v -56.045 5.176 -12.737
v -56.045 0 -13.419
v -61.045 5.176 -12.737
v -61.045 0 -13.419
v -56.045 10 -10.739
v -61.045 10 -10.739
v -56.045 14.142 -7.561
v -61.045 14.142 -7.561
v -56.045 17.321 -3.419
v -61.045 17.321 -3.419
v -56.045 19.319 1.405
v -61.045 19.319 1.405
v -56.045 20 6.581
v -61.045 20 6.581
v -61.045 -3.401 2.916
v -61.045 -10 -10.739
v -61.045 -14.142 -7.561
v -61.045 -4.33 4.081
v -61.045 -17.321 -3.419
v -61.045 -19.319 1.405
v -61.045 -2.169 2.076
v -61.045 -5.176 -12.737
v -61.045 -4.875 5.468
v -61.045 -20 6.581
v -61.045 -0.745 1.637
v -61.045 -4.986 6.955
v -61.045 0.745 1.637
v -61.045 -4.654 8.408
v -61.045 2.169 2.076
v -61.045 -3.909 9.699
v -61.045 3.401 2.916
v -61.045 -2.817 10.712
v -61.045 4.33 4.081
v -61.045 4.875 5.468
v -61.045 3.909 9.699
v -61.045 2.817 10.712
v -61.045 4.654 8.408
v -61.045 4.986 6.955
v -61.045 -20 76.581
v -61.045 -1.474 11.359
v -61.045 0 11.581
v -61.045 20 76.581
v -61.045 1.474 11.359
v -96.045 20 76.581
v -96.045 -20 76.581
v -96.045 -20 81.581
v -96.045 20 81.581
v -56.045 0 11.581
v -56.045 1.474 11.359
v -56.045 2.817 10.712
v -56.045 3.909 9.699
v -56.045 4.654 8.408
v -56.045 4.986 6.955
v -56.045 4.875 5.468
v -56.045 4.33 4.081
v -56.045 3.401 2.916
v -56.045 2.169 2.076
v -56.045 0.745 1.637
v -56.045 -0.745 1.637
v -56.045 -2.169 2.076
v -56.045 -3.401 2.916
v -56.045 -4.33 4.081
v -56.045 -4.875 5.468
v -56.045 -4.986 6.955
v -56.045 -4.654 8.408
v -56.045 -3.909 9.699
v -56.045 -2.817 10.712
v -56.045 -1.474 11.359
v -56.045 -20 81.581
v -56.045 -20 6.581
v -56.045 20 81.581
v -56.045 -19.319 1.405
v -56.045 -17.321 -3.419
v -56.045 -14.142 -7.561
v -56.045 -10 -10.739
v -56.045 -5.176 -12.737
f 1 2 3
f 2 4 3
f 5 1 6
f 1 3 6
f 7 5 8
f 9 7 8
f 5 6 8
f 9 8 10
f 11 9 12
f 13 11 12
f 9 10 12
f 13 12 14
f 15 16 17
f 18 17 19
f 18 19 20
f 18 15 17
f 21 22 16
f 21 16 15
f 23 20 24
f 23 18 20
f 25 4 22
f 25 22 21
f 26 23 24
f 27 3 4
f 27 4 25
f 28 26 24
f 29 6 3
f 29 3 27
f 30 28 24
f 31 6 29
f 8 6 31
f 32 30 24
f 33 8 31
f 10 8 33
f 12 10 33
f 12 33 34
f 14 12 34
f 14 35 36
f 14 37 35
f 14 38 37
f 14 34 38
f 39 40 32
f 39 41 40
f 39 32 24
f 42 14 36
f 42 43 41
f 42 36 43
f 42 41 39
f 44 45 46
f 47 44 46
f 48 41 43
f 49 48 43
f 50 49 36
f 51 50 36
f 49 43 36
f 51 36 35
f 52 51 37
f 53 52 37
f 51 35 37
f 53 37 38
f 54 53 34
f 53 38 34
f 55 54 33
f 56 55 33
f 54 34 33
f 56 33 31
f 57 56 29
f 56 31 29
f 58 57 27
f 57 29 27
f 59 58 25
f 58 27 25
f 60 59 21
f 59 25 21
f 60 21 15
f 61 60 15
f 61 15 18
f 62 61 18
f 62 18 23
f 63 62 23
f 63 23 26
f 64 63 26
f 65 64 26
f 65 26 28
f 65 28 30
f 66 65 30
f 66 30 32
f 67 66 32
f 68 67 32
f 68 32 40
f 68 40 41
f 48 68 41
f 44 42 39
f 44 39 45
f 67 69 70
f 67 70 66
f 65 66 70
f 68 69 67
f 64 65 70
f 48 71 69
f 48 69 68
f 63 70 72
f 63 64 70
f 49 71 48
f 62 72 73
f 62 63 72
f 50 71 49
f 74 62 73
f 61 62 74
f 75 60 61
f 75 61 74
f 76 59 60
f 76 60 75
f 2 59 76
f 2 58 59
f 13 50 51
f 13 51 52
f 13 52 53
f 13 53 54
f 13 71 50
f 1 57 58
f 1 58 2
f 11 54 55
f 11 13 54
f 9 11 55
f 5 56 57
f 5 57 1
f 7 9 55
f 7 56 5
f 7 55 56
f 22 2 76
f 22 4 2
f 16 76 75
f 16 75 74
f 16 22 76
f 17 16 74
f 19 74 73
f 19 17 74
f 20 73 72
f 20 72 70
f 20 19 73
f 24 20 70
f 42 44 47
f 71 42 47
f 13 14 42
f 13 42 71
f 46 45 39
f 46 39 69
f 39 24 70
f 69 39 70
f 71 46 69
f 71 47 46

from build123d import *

# Parameters (mm, degrees)
BOSS_EXTRUDE1_DEPTH = 20
SKETCH2_R           = 5
CUT_EXTRUDE1_DEPTH  = 40
FILLET1_R           = 20
FILLET2_R           = 20


with BuildPart() as part:
    # Sketch1 → Boss-Extrude1 (new, symmetric)
    with BuildSketch(Plane(origin=(0, 0, 0), x_dir=(1, 0, 0), z_dir=(0, 1, 0))):
        Polygon((-56.045207575, 13.418938385), (-61.045207575, 13.418938385), (-61.045207575, -76.581061615), (-96.045207575, -76.581061615), (-96.045207575, -81.581061615), (-56.045207575, -81.581061615), align=None)
    extrude(amount=BOSS_EXTRUDE1_DEPTH, both=True)

    # Sketch2 → Cut-Extrude1 (cut)
    with BuildSketch(Plane.ZY.offset(61.045207575)):
        with Locations((6.581061615, 0)):
            Circle(SKETCH2_R)
    extrude(amount=-CUT_EXTRUDE1_DEPTH, mode=Mode.SUBTRACT)

    # Fillet1
    fillet1_edges = [part.edges().sort_by_distance(p)[0] for p in [
        (-58.545207575, 20, -13.418938385),
    ]]
    fillet(fillet1_edges, radius=FILLET1_R)

    # Fillet2
    fillet2_edges = [part.edges().sort_by_distance(p)[0] for p in [
        (-58.545207575, -20, -13.418938385),
    ]]
    fillet(fillet2_edges, radius=FILLET2_R - 0.0001)  # a hair under: the kernel refuses the full size


solid = part.part
